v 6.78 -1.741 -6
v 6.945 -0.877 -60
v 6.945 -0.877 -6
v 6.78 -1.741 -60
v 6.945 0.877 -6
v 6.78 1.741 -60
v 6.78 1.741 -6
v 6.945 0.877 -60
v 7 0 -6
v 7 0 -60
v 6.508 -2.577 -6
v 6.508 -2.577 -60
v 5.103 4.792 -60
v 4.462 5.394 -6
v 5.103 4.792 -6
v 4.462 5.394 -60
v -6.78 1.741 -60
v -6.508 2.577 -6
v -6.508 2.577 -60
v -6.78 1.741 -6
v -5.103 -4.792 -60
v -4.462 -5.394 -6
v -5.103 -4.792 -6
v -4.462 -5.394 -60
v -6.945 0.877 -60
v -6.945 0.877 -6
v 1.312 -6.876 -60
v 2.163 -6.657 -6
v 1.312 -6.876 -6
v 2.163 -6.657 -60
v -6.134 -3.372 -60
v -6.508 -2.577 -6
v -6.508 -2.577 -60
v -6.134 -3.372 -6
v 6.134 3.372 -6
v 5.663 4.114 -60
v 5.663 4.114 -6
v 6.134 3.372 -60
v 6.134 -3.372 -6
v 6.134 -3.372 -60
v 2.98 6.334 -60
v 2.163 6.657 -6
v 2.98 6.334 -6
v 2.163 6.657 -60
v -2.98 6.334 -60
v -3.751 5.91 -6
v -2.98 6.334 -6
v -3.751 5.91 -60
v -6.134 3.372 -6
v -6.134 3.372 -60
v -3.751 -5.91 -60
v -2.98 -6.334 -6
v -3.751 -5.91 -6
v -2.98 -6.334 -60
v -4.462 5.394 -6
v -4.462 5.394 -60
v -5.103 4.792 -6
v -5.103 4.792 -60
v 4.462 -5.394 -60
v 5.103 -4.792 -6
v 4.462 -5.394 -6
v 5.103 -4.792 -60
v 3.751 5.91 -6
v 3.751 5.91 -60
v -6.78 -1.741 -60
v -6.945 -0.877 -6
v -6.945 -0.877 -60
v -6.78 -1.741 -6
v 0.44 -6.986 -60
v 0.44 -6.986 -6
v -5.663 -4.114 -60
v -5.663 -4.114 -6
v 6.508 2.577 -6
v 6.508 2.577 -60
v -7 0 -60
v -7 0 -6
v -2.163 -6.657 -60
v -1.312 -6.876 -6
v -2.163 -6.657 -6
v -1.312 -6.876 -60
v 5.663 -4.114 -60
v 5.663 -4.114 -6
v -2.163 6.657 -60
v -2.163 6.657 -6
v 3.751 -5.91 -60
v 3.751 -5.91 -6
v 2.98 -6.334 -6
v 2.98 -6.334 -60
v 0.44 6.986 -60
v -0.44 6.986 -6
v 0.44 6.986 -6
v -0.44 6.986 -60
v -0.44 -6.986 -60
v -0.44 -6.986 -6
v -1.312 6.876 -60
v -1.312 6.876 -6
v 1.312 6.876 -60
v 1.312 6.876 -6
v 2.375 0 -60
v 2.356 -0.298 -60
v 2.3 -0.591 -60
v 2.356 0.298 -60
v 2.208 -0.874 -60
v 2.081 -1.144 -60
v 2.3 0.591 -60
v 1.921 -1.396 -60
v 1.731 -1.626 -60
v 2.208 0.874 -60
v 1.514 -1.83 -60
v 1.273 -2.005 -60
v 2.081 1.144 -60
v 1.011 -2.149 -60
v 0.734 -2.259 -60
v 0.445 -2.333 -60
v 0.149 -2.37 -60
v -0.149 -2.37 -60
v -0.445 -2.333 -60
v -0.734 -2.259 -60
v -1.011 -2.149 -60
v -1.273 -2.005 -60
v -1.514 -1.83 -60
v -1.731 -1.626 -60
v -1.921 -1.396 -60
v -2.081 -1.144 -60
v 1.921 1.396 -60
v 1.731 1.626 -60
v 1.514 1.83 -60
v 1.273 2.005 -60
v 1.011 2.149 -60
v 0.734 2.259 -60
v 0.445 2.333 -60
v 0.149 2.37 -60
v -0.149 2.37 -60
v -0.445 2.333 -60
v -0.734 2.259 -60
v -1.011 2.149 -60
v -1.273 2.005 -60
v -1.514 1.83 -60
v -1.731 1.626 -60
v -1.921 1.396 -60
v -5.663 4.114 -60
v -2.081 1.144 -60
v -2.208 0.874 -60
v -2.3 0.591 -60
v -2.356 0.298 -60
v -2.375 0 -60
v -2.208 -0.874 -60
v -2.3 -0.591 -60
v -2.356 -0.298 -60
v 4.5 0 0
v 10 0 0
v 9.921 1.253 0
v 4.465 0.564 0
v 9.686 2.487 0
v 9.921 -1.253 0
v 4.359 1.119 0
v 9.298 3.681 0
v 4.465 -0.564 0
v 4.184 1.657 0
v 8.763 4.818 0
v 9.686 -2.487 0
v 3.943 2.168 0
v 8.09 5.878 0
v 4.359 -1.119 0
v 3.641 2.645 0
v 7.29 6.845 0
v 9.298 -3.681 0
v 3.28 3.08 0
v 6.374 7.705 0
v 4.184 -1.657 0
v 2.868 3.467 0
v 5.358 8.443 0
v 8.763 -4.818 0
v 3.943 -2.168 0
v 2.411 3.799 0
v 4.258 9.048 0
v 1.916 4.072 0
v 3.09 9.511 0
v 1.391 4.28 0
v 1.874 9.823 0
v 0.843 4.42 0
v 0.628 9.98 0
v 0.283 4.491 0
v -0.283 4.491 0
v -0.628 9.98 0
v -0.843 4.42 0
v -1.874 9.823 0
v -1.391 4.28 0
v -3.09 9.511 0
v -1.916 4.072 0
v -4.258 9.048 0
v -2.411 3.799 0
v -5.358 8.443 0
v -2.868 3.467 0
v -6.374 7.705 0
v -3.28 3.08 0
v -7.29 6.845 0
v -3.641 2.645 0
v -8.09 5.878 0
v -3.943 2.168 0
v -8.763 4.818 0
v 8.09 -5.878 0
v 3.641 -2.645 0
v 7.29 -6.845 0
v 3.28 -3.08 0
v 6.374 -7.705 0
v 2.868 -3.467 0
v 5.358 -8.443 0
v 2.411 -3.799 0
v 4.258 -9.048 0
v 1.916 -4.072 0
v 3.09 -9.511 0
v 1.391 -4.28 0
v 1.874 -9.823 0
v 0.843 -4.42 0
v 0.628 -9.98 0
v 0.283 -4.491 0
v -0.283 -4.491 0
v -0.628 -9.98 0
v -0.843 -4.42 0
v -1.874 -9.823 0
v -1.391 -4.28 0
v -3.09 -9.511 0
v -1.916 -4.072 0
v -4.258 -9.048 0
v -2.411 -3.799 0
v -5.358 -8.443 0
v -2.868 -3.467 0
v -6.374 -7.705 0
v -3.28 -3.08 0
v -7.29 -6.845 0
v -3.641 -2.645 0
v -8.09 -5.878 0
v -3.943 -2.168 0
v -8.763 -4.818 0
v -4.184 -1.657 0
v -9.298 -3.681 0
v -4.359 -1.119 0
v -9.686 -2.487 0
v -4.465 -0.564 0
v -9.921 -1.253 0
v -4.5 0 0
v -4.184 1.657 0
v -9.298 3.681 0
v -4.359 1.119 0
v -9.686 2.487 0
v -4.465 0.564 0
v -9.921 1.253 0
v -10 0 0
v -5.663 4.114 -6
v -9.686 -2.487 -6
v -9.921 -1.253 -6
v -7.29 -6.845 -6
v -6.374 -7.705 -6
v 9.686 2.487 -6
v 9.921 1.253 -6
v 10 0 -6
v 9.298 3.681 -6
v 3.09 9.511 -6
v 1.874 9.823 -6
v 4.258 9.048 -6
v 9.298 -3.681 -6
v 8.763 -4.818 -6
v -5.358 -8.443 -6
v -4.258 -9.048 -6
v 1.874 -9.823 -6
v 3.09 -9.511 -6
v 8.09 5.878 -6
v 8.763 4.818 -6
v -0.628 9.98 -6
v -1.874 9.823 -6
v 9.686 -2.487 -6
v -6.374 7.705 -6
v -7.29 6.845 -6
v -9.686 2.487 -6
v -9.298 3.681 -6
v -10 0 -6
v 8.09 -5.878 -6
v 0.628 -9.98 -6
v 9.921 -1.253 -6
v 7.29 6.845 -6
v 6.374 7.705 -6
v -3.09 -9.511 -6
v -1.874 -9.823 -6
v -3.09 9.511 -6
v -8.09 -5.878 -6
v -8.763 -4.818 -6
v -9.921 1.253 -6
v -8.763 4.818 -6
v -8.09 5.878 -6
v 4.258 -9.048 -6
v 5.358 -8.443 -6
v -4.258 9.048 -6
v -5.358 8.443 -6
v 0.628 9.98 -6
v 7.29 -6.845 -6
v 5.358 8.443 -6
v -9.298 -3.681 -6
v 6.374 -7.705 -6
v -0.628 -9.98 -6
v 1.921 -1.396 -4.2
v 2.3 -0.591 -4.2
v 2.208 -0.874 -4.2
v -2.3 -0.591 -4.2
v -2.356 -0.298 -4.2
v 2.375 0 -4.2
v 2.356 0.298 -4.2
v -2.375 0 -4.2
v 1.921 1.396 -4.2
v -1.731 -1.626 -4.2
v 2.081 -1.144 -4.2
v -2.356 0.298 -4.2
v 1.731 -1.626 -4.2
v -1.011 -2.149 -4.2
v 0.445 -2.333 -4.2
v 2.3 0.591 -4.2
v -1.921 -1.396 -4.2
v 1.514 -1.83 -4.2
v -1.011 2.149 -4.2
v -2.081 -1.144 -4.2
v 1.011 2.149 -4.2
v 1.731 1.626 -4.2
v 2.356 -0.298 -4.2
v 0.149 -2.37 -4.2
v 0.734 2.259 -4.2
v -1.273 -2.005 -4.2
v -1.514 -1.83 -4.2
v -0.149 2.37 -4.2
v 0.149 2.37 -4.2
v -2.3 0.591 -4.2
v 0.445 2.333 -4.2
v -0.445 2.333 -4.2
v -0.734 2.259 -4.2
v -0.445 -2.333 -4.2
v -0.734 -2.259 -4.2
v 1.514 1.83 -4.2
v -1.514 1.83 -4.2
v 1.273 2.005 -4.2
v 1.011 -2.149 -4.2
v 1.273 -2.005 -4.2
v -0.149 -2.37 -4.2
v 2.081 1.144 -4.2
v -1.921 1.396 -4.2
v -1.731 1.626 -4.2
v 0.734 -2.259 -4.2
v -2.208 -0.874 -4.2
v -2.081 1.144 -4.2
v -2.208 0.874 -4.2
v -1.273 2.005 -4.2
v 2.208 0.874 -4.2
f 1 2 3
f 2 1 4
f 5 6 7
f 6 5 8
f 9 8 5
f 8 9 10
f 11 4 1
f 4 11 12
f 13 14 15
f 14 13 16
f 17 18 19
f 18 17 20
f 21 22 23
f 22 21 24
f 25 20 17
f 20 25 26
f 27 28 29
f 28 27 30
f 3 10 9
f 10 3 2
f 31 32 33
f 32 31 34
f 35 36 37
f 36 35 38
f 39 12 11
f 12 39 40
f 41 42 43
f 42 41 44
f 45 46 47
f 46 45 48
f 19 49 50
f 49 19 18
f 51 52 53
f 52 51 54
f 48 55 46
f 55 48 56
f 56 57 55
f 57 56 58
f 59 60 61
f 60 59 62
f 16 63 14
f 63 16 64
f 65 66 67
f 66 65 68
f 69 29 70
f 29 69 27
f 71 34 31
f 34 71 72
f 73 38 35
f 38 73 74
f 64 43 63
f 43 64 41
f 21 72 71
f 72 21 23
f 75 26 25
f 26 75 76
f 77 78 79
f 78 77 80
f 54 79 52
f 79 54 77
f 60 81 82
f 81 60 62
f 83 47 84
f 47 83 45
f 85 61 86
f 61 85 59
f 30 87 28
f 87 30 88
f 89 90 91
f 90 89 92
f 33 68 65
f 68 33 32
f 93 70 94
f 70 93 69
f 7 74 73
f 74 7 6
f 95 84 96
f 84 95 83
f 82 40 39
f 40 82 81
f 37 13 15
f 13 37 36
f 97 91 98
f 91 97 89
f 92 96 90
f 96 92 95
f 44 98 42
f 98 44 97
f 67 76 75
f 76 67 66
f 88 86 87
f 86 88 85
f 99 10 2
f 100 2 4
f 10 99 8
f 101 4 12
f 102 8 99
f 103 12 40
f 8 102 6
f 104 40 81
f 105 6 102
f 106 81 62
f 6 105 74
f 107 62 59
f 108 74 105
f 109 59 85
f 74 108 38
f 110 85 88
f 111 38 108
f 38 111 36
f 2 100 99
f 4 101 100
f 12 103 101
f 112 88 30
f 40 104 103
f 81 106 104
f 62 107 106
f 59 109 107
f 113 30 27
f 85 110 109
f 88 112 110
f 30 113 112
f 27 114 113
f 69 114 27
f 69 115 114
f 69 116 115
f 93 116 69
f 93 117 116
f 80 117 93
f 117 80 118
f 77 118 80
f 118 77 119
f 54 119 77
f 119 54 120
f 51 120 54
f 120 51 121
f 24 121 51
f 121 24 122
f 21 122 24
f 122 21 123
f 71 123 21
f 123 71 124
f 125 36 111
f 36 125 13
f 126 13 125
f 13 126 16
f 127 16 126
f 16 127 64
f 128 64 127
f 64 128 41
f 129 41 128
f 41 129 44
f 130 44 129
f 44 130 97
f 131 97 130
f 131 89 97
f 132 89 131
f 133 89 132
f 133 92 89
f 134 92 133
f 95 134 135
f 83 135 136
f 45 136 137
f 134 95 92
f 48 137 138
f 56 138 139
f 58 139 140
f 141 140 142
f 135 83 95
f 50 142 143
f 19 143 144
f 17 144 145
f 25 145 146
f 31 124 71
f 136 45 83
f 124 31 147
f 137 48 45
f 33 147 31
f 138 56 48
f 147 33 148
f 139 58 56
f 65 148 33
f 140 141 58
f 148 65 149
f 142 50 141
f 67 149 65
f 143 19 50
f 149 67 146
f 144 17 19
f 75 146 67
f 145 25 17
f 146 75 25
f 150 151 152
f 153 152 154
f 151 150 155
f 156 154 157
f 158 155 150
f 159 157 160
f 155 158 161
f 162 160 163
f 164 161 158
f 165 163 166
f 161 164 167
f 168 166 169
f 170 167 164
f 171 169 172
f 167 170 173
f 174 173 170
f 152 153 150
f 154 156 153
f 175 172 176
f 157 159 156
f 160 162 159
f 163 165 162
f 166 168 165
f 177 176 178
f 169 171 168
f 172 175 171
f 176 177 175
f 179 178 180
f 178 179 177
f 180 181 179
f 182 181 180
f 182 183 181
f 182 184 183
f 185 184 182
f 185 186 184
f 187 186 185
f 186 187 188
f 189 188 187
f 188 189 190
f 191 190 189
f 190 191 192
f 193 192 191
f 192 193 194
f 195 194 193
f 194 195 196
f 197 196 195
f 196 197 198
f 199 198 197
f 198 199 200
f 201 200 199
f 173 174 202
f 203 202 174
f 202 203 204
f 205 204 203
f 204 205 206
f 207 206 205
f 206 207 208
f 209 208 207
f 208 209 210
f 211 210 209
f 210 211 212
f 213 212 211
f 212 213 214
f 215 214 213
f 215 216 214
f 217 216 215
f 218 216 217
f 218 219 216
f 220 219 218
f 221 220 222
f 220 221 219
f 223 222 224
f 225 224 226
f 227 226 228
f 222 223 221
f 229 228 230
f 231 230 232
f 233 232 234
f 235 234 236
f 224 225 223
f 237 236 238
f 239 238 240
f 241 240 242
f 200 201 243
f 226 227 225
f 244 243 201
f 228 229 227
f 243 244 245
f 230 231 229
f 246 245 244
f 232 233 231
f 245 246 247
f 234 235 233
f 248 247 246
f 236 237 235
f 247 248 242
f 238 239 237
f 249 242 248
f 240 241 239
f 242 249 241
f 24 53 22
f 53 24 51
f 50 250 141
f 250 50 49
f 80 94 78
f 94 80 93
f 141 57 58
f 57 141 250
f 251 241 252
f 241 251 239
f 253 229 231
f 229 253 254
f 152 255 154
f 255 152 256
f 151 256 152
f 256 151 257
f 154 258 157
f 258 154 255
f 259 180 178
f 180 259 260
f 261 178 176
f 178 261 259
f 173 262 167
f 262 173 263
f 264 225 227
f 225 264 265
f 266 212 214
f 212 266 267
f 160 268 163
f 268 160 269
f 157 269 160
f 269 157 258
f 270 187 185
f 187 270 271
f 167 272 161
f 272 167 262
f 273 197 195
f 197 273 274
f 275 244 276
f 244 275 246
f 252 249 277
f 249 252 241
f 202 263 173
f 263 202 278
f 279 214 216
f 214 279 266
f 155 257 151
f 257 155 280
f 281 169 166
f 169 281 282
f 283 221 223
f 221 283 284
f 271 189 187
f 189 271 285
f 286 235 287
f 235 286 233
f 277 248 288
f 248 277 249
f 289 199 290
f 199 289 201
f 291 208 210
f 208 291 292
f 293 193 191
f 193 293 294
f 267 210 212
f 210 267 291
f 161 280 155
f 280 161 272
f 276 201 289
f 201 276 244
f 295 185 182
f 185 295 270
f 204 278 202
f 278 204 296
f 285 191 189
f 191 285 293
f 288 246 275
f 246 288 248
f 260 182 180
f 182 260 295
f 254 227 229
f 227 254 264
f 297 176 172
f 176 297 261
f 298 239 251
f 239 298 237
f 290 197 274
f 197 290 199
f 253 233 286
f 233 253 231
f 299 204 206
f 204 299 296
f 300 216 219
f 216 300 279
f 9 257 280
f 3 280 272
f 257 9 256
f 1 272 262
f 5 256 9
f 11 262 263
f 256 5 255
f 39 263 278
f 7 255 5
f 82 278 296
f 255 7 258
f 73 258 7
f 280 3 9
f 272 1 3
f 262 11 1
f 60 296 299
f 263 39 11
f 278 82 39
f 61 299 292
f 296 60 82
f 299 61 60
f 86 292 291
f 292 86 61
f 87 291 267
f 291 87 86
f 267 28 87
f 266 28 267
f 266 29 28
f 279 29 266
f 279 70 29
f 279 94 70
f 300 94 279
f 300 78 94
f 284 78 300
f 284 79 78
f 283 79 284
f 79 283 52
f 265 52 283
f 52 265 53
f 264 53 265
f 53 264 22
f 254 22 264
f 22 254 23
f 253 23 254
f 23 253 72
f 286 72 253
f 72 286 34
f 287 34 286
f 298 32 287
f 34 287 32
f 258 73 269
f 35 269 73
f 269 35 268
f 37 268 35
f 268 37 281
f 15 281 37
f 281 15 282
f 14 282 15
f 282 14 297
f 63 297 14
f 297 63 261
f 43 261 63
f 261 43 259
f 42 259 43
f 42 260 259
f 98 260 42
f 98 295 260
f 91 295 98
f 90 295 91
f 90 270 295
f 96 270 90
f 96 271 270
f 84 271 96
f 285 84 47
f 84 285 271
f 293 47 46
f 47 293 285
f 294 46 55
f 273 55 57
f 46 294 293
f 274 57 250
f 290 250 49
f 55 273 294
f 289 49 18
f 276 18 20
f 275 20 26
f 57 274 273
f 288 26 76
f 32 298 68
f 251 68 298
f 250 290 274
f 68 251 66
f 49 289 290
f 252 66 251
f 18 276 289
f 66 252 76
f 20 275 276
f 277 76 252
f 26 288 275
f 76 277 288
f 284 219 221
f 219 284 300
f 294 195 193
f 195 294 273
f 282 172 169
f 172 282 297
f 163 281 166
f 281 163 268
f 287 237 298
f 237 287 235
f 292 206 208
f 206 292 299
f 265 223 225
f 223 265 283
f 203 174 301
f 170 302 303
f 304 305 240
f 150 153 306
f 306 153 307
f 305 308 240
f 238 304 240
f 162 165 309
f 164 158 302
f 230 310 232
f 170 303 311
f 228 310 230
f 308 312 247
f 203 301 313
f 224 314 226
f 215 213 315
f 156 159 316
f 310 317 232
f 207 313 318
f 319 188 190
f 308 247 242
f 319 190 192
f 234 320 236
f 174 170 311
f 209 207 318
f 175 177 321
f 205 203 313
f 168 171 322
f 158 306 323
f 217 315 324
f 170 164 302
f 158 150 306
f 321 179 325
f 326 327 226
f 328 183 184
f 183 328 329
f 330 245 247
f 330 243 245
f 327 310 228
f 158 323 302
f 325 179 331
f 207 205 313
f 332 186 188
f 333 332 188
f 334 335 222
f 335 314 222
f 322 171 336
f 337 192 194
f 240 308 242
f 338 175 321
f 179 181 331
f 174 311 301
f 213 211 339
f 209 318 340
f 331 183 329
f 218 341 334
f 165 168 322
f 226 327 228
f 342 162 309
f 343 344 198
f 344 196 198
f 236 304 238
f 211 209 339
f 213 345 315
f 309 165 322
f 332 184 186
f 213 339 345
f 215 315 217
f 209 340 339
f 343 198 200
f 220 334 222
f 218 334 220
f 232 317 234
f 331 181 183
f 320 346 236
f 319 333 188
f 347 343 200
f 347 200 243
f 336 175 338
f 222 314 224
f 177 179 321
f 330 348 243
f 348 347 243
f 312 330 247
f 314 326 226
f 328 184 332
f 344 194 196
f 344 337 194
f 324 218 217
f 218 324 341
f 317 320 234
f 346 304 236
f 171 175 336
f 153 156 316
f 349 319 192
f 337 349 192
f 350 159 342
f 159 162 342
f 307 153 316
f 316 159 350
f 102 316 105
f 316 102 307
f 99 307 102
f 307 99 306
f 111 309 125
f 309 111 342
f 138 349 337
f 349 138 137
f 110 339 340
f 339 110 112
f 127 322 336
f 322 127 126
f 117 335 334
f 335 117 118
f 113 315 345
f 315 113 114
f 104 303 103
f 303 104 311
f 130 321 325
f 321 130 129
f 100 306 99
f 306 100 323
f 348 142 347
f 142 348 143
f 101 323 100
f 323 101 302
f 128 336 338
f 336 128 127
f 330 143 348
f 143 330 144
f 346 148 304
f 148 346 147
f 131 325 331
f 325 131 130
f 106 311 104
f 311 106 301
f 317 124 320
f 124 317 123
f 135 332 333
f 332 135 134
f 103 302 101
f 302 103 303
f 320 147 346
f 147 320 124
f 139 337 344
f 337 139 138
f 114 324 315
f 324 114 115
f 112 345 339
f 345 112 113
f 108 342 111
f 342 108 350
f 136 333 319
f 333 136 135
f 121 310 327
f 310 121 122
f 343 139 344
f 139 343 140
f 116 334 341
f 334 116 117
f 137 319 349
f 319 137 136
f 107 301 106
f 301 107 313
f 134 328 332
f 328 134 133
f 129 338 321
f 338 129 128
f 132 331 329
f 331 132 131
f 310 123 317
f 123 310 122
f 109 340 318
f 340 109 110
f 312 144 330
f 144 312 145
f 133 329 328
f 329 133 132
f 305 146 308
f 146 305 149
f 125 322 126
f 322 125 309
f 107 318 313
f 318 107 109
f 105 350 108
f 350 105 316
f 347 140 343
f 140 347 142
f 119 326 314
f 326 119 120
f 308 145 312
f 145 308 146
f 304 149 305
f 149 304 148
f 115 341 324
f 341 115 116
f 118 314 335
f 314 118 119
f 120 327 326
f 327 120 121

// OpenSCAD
$fn = 50;


difference() {
	union() {
		translate(v = [0, 0, -60.0000000000]) {
			cylinder(h = 60, r = 7.0000000000);
		}
		translate(v = [0, 0, -6.0000000000]) {
			cylinder(h = 6, r = 10.0000000000);
		}
	}
	union() {
		translate(v = [0, 0, 0]) {
			rotate(a = [0, 0, 0]) {
				difference() {
					union() {
						#translate(v = [0, 0, -60.0000000000]) {
							cylinder(h = 60, r = 2.2500000000);
						}
						#translate(v = [0, 0, -4.2000000000]) {
							cylinder(h = 4.2000000000, r = 7.0000000000, r1 = 2.3750000000, r2 = 4.5000000000);
						}
						#translate(v = [0, 0, -60.0000000000]) {
							cylinder(h = 60, r = 2.3750000000);
						}
						#translate(v = [0, 0, -60.0000000000]) {
							cylinder(h = 60, r = 2.2500000000);
						}
					}
					union();
				}
			}
		}
	}
}
